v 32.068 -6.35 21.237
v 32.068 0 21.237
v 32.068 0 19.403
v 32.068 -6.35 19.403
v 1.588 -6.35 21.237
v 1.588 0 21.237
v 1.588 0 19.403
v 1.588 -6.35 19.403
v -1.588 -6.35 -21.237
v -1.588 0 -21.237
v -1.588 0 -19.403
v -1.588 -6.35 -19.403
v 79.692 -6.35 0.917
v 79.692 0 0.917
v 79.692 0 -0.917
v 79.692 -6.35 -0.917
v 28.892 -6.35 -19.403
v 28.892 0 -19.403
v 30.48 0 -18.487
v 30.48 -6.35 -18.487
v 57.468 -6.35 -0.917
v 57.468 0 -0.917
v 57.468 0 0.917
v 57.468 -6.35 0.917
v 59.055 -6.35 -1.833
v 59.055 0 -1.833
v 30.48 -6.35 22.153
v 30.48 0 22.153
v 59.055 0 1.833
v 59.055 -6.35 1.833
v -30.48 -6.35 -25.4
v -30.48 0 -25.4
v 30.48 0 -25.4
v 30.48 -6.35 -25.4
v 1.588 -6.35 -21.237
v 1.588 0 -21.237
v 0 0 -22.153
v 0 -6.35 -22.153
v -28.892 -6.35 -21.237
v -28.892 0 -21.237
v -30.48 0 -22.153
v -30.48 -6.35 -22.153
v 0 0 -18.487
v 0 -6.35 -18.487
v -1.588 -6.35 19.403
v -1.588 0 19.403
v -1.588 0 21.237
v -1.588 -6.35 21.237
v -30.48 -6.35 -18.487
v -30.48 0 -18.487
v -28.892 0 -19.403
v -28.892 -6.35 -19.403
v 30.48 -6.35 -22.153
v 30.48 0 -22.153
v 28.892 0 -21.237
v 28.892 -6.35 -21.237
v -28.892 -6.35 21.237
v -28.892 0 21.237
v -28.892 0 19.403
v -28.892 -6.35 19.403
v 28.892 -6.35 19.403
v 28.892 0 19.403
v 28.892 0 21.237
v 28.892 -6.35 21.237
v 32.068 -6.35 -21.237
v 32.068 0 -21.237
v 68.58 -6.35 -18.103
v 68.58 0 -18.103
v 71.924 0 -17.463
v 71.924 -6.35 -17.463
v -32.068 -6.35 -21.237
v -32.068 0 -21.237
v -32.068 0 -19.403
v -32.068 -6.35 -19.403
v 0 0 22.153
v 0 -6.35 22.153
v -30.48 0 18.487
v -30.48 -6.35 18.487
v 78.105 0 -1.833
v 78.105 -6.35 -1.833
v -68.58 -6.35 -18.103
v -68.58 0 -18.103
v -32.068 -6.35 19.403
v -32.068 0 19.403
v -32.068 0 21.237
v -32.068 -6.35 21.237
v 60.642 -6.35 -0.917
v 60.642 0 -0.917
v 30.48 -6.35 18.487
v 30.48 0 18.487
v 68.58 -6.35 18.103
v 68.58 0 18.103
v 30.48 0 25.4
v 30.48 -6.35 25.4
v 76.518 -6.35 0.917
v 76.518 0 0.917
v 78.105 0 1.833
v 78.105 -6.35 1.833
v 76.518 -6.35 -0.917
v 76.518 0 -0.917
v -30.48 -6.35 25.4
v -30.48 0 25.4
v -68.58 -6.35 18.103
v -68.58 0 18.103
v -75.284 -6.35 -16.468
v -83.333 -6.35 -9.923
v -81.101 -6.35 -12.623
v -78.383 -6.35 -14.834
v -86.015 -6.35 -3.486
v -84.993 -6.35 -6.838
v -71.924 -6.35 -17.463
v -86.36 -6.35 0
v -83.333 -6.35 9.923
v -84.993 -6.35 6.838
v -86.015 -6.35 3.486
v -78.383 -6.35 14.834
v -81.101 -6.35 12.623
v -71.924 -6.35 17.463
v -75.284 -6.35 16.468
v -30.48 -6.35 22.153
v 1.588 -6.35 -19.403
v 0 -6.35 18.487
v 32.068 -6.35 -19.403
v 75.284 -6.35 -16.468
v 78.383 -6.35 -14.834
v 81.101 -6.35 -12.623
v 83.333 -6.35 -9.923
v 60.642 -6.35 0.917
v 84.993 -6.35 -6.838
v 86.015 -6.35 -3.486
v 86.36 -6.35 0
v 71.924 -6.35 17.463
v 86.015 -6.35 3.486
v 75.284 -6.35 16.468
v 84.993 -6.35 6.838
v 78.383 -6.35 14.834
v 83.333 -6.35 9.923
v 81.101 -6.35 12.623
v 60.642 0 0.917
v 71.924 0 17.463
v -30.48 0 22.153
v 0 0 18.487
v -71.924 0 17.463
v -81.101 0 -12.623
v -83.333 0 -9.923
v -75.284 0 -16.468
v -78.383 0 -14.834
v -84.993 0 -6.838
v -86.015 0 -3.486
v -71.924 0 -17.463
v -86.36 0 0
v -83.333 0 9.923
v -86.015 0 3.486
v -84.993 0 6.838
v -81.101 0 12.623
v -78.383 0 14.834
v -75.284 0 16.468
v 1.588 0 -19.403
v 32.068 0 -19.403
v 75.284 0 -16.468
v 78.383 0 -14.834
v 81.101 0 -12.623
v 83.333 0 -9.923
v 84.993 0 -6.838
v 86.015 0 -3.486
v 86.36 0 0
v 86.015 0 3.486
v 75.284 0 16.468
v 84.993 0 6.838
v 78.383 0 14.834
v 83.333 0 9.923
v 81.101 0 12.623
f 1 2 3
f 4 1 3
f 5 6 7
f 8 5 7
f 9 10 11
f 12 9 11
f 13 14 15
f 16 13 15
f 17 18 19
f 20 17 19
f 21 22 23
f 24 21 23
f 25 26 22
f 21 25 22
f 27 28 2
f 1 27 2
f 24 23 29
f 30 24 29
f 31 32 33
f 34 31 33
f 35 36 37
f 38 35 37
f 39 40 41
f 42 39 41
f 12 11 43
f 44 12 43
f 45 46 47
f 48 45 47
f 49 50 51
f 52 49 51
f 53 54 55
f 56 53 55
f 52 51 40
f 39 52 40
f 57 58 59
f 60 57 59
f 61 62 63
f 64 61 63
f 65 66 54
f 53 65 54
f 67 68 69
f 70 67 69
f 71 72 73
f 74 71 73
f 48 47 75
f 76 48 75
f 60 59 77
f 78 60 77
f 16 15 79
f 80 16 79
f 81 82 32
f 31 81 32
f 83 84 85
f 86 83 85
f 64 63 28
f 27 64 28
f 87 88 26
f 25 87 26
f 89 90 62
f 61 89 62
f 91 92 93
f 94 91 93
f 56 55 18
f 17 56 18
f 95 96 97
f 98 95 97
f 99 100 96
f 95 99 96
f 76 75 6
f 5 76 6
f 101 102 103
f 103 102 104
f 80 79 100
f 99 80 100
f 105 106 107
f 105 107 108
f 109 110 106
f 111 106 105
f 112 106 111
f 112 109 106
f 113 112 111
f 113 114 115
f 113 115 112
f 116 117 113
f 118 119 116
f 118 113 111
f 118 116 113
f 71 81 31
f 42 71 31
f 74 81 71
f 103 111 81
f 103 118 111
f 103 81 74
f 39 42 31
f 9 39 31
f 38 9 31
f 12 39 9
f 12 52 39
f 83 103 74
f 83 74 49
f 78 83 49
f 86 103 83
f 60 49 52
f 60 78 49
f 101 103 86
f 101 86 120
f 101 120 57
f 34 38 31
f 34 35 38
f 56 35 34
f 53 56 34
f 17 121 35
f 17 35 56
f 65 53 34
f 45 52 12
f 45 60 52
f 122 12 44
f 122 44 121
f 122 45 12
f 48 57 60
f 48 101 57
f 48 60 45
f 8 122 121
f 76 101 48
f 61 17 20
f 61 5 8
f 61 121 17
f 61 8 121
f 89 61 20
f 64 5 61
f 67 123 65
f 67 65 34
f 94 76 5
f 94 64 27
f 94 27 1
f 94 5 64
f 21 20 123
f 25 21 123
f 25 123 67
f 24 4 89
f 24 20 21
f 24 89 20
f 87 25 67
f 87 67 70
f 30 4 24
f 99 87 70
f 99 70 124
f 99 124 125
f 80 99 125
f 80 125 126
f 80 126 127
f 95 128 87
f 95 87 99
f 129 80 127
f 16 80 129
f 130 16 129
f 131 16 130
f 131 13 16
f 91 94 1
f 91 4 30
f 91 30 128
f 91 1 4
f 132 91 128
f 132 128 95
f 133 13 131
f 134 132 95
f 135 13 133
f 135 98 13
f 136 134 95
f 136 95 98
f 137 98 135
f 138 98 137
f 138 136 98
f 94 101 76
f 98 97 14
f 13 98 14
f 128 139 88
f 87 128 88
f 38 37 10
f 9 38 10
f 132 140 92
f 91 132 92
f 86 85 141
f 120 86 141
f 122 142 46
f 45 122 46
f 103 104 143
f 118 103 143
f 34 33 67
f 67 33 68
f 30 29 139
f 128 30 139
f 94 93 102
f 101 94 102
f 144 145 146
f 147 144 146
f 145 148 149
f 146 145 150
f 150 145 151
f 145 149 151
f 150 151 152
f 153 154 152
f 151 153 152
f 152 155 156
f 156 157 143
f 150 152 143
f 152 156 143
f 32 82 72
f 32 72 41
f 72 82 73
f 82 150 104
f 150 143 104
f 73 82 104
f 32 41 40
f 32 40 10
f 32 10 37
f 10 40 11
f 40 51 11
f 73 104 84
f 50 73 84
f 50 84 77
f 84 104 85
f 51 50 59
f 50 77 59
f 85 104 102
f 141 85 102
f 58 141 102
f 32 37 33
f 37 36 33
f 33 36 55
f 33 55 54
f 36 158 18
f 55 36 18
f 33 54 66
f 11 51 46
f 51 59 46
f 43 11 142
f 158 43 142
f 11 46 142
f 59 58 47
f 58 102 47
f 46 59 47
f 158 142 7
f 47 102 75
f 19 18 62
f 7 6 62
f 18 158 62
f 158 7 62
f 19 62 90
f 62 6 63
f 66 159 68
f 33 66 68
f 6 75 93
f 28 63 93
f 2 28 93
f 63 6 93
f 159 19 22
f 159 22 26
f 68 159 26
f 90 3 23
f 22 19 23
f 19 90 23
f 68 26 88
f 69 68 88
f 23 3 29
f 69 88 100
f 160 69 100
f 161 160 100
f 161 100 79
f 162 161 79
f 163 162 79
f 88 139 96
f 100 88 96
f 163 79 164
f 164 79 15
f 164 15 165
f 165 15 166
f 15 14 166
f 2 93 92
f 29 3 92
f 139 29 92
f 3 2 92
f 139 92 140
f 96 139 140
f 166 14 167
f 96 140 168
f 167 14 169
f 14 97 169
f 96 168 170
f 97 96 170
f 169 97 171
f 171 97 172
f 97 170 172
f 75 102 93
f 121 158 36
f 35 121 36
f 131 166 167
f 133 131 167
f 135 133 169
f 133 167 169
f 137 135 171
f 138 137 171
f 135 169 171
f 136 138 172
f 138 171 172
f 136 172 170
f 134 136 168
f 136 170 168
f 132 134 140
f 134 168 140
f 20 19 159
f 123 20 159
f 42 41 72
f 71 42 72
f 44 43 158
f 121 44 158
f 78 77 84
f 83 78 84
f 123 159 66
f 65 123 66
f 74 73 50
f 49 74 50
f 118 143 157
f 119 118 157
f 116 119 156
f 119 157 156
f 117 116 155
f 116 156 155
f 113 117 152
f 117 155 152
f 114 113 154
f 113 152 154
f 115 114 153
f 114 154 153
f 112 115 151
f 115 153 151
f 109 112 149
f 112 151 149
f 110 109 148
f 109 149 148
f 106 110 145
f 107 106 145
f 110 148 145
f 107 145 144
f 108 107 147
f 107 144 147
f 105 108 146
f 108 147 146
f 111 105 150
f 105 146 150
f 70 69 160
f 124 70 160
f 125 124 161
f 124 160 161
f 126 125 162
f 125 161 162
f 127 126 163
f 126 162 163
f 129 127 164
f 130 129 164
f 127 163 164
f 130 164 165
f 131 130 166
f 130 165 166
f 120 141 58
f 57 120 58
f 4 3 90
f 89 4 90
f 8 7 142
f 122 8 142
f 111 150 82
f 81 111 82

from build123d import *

# Parameters (mm, degrees)
F1_DEPTH = 6.35


with BuildPart() as f1:
    # F0 (on Front) → F1 (new body)
    with BuildSketch(Plane.XZ):
        with BuildLine():
            Line((68.58, 18.1031430027), (30.48, 25.4))
            Line((30.48, 25.4), (-30.48, 25.4))
            Line((-30.48, 25.4), (-68.58, 18.1031430027))
            Line((-68.58, 18.1031430027), (-68.58, 17.78))
            ThreePointArc((-68.58, 17.78), (-65.5387583202, 17.5179693185), (-62.5871565312, 16.7396005675))
            Line((-62.5871565312, 16.7396005675), (-61.5696, 17.3270871047))
            Line((-61.5696, 17.3270871047), (-59.9821, 16.4105435523))
            Line((-59.9821, 16.4105435523), (-59.9821, 15.5629211779))
            ThreePointArc((-59.9821, 15.5629211779), (-53.2666224823, 9.0348696172), (-50.8, 0))
            ThreePointArc((-50.8, 0), (-53.2666224823, -9.0348696172), (-59.9821, -15.5629211779))
            Line((-59.9821, -15.5629211779), (-59.9821, -16.4105435523))
            Line((-59.9821, -16.4105435523), (-61.5696, -17.3270871047))
            Line((-61.5696, -17.3270871047), (-62.5871565312, -16.7396005675))
            ThreePointArc((-62.5871565312, -16.7396005675), (-65.5387583202, -17.5179693185), (-68.58, -17.78))
            Line((-68.58, -17.78), (-68.58, -18.1031430027))
            Line((-68.58, -18.1031430027), (-30.48, -25.4))
            Line((-30.48, -25.4), (30.48, -25.4))
            Line((30.48, -25.4), (68.58, -18.1031430027))
            Line((68.58, -18.1031430027), (68.58, -17.78))
            ThreePointArc((68.58, -17.78), (50.8, 0), (68.58, 17.78))
            Line((68.58, 17.78), (68.58, 18.1031430027))
        make_face()
        Polygon((-30.48, -18.4869128953), (-28.8925, -19.4034564477), (-28.8925, -21.2365435523), (-30.48, -22.1530871047), (-32.0675, -21.2365435523), (-32.0675, -19.4034564477), align=None, mode=Mode.SUBTRACT)
        Polygon((-19.05, -15.9469128953), (-17.4625, -16.8634564477), (-17.4625, -18.6965435523), (-19.05, -19.6130871047), (-20.6375, -18.6965435523), (-20.6375, -16.8634564477), align=None, mode=Mode.SUBTRACT)
        Polygon((-48.1514023938, -5.9139128953), (-46.5639023938, -6.8304564477), (-46.5639023938, -8.6635435523), (-48.1514023938, -9.5800871047), (-49.7389023938, -8.6635435523), (-49.7389023938, -6.8304564477), align=None, mode=Mode.SUBTRACT)
        Polygon((0, -18.4869128953), (1.5875, -19.4034564477), (1.5875, -21.2365435523), (0, -22.1530871047), (-1.5875, -21.2365435523), (-1.5875, -19.4034564477), align=None, mode=Mode.SUBTRACT)
        Polygon((30.48, -22.1530871047), (28.8925, -21.2365435523), (28.8925, -19.4034564477), (30.48, -18.4869128953), (32.0675, -19.4034564477), (32.0675, -21.2365435523), align=None, mode=Mode.SUBTRACT)
        Polygon((19.05, -19.6130871047), (17.4625, -18.6965435523), (17.4625, -16.8634564477), (19.05, -15.9469128953), (20.6375, -16.8634564477), (20.6375, -18.6965435523), align=None, mode=Mode.SUBTRACT)
        Polygon((-48.1514023938, 9.5800871047), (-46.5639023938, 8.6635435523), (-46.5639023938, 6.8304564477), (-48.1514023938, 5.9139128953), (-49.7389023938, 6.8304564477), (-49.7389023938, 8.6635435523), align=None, mode=Mode.SUBTRACT)
        Polygon((-19.05, 19.6130871047), (-17.4625, 18.6965435523), (-17.4625, 16.8634564477), (-19.05, 15.9469128953), (-20.6375, 16.8634564477), (-20.6375, 18.6965435523), align=None, mode=Mode.SUBTRACT)
        Polygon((-30.48, 22.1530871047), (-28.8925, 21.2365435523), (-28.8925, 19.4034564477), (-30.48, 18.4869128953), (-32.0675, 19.4034564477), (-32.0675, 21.2365435523), align=None, mode=Mode.SUBTRACT)
        Polygon((19.05, 19.6130871047), (20.6375, 18.6965435523), (20.6375, 16.8634564477), (19.05, 15.9469128953), (17.4625, 16.8634564477), (17.4625, 18.6965435523), align=None, mode=Mode.SUBTRACT)
        Polygon((0, 22.1530871047), (1.5875, 21.2365435523), (1.5875, 19.4034564477), (0, 18.4869128953), (-1.5875, 19.4034564477), (-1.5875, 21.2365435523), align=None, mode=Mode.SUBTRACT)
        Polygon((30.48, 18.4869128953), (28.8925, 19.4034564477), (28.8925, 21.2365435523), (30.48, 22.1530871047), (32.0675, 21.2365435523), (32.0675, 19.4034564477), align=None, mode=Mode.SUBTRACT)
        with BuildLine():
            ThreePointArc((-62.5871565312, 16.7396005675), (-65.5387583202, 17.5179693185), (-68.58, 17.78))
            Line((-68.58, 17.78), (-68.58, 7.3323484187))
            Line((-68.58, 7.3323484187), (-62.23, 3.6661742094))
            Line((-62.23, 3.6661742094), (-62.23, -3.6661742094))
            Line((-62.23, -3.6661742094), (-68.58, -7.3323484187))
            Line((-68.58, -7.3323484187), (-68.58, -17.78))
            ThreePointArc((-68.58, -17.78), (-65.5387583202, -17.5179693185), (-62.5871565312, -16.7396005675))
            Line((-62.5871565312, -16.7396005675), (-63.1571, -16.4105435523))
            Line((-63.1571, -16.4105435523), (-63.1571, -14.5774564477))
            Line((-63.1571, -14.5774564477), (-61.5696, -13.6609128953))
            Line((-61.5696, -13.6609128953), (-59.9821, -14.5774564477))
            Line((-59.9821, -14.5774564477), (-59.9821, -15.5629211779))
            ThreePointArc((-59.9821, -15.5629211779), (-53.2666224823, -9.0348696172), (-50.8, 0))
            ThreePointArc((-50.8, 0), (-53.2666224823, 9.0348696172), (-59.9821, 15.5629211779))
            Line((-59.9821, 15.5629211779), (-59.9821, 14.5774564477))
            Line((-59.9821, 14.5774564477), (-61.5696, 13.6609128953))
            Line((-61.5696, 13.6609128953), (-63.1571, 14.5774564477))
            Line((-63.1571, 14.5774564477), (-63.1571, 16.4105435523))
            Line((-63.1571, 16.4105435523), (-62.5871565312, 16.7396005675))
        make_face()
        with BuildLine():
            Line((-68.58, 7.3323484187), (-68.58, 17.78))
            ThreePointArc((-68.58, 17.78), (-70.259720977, 17.7004784523), (-71.9244167559, 17.4626251338))
            ThreePointArc((-71.9244167559, 17.4626251338), (-86.36, 0), (-71.9244167559, -17.4626251338))
            ThreePointArc((-71.9244167559, -17.4626251338), (-70.259720977, -17.7004784523), (-68.58, -17.78))
            Line((-68.58, -17.78), (-68.58, -7.3323484187))
            Line((-68.58, -7.3323484187), (-74.93, -3.6661742094))
            Line((-74.93, -3.6661742094), (-74.93, 3.6661742094))
            Line((-74.93, 3.6661742094), (-68.58, 7.3323484187))
        make_face()
        Polygon((-74.9877976062, -9.5800871047), (-76.5752976062, -8.6635435523), (-76.5752976062, -6.8304564477), (-74.9877976062, -5.9139128953), (-73.4002976062, -6.8304564477), (-73.4002976062, -8.6635435523), align=None, mode=Mode.SUBTRACT)
        Polygon((-74.9877976062, 9.5800871047), (-73.4002976062, 8.6635435523), (-73.4002976062, 6.8304564477), (-74.9877976062, 5.9139128953), (-76.5752976062, 6.8304564477), (-76.5752976062, 8.6635435523), align=None, mode=Mode.SUBTRACT)
        with BuildLine():
            Line((68.58, -17.78), (68.58, 17.78))
            ThreePointArc((68.58, 17.78), (50.8, 0), (68.58, -17.78))
        make_face()
        Polygon((59.055, -1.8330871047), (57.4675, -0.9165435523), (57.4675, 0.9165435523), (59.055, 1.8330871047), (60.6425, 0.9165435523), (60.6425, -0.9165435523), align=None, mode=Mode.SUBTRACT)
        with BuildLine():
            ThreePointArc((71.9244167559, 17.4626251338), (70.259720977, 17.7004784523), (68.58, 17.78))
            Line((68.58, 17.78), (68.58, -17.78))
            ThreePointArc((68.58, -17.78), (70.259720977, -17.7004784523), (71.9244167559, -17.4626251338))
            ThreePointArc((71.9244167559, -17.4626251338), (82.2838704372, -11.3283862505), (86.36, 0))
            ThreePointArc((86.36, 0), (82.2838704372, 11.3283862505), (71.9244167559, 17.4626251338))
        make_face()
        Polygon((78.105, 1.8330871047), (79.6925, 0.9165435523), (79.6925, -0.9165435523), (78.105, -1.8330871047), (76.5175, -0.9165435523), (76.5175, 0.9165435523), align=None, mode=Mode.SUBTRACT)
        with BuildLine():
            ThreePointArc((-68.58, -17.78), (-70.259720977, -17.7004784523), (-71.9244167559, -17.4626251338))
            Line((-71.9244167559, -17.4626251338), (-68.58, -18.1031430027))
            Line((-68.58, -18.1031430027), (-68.58, -17.78))
        make_face()
        with BuildLine():
            Line((-68.58, 17.78), (-68.58, 18.1031430027))
            Line((-68.58, 18.1031430027), (-71.9244167559, 17.4626251338))
            ThreePointArc((-71.9244167559, 17.4626251338), (-70.259720977, 17.7004784523), (-68.58, 17.78))
        make_face()
        with BuildLine():
            Line((71.9244167559, 17.4626251338), (68.58, 18.1031430027))
            Line((68.58, 18.1031430027), (68.58, 17.78))
            ThreePointArc((68.58, 17.78), (70.259720977, 17.7004784523), (71.9244167559, 17.4626251338))
        make_face()
        with BuildLine():
            ThreePointArc((71.9244167559, -17.4626251338), (70.259720977, -17.7004784523), (68.58, -17.78))
            Line((68.58, -17.78), (68.58, -18.1031430027))
            Line((68.58, -18.1031430027), (71.9244167559, -17.4626251338))
        make_face()
        Polygon((-73.4002976062, 6.8304564477), (-73.4002976062, 8.6635435523), (-74.9877976062, 9.5800871047), (-76.5752976062, 8.6635435523), (-76.5752976062, 6.8304564477), (-74.9877976062, 5.9139128953), align=None)
        Polygon((-76.5752976062, -6.8304564477), (-76.5752976062, -8.6635435523), (-74.9877976062, -9.5800871047), (-73.4002976062, -8.6635435523), (-73.4002976062, -6.8304564477), (-74.9877976062, -5.9139128953), align=None)
        Polygon((-68.58, -7.3323484187), (-68.58, 7.3323484187), (-74.93, 3.6661742094), (-74.93, -3.6661742094), align=None)
        Polygon((-62.23, 3.6661742094), (-68.58, 7.3323484187), (-68.58, -7.3323484187), (-62.23, -3.6661742094), align=None)
        with BuildLine():
            ThreePointArc((-59.9821, 15.5629211779), (-61.260943207, 16.2036973454), (-62.5871565312, 16.7396005675))
            Line((-62.5871565312, 16.7396005675), (-63.1571, 16.4105435523))
            Line((-63.1571, 16.4105435523), (-63.1571, 14.5774564477))
            Line((-63.1571, 14.5774564477), (-61.5696, 13.6609128953))
            Line((-61.5696, 13.6609128953), (-59.9821, 14.5774564477))
            Line((-59.9821, 14.5774564477), (-59.9821, 15.5629211779))
        make_face()
        with BuildLine():
            Line((-61.5696, 17.3270871047), (-62.5871565312, 16.7396005675))
            ThreePointArc((-62.5871565312, 16.7396005675), (-61.260943207, 16.2036973454), (-59.9821, 15.5629211779))
            Line((-59.9821, 15.5629211779), (-59.9821, 16.4105435523))
            Line((-59.9821, 16.4105435523), (-61.5696, 17.3270871047))
        make_face()
        Polygon((-46.5639023938, 6.8304564477), (-46.5639023938, 8.6635435523), (-48.1514023938, 9.5800871047), (-49.7389023938, 8.6635435523), (-49.7389023938, 6.8304564477), (-48.1514023938, 5.9139128953), align=None)
        Polygon((-46.5639023938, -8.6635435523), (-46.5639023938, -6.8304564477), (-48.1514023938, -5.9139128953), (-49.7389023938, -6.8304564477), (-49.7389023938, -8.6635435523), (-48.1514023938, -9.5800871047), align=None)
        with BuildLine():
            Line((-63.1571, -16.4105435523), (-62.5871565312, -16.7396005675))
            ThreePointArc((-62.5871565312, -16.7396005675), (-61.260943207, -16.2036973454), (-59.9821, -15.5629211779))
            Line((-59.9821, -15.5629211779), (-59.9821, -14.5774564477))
            Line((-59.9821, -14.5774564477), (-61.5696, -13.6609128953))
            Line((-61.5696, -13.6609128953), (-63.1571, -14.5774564477))
            Line((-63.1571, -14.5774564477), (-63.1571, -16.4105435523))
        make_face()
        with BuildLine():
            ThreePointArc((-59.9821, -15.5629211779), (-61.260943207, -16.2036973454), (-62.5871565312, -16.7396005675))
            Line((-62.5871565312, -16.7396005675), (-61.5696, -17.3270871047))
            Line((-61.5696, -17.3270871047), (-59.9821, -16.4105435523))
            Line((-59.9821, -16.4105435523), (-59.9821, -15.5629211779))
        make_face()
        Polygon((-17.4625, 16.8634564477), (-17.4625, 18.6965435523), (-19.05, 19.6130871047), (-20.6375, 18.6965435523), (-20.6375, 16.8634564477), (-19.05, 15.9469128953), align=None)
        Polygon((-17.4625, -18.6965435523), (-17.4625, -16.8634564477), (-19.05, -15.9469128953), (-20.6375, -16.8634564477), (-20.6375, -18.6965435523), (-19.05, -19.6130871047), align=None)
        Polygon((17.4625, -16.8634564477), (17.4625, -18.6965435523), (19.05, -19.6130871047), (20.6375, -18.6965435523), (20.6375, -16.8634564477), (19.05, -15.9469128953), align=None)
        Polygon((20.6375, 16.8634564477), (20.6375, 18.6965435523), (19.05, 19.6130871047), (17.4625, 18.6965435523), (17.4625, 16.8634564477), (19.05, 15.9469128953), align=None)
    extrude(amount=F1_DEPTH)


solid = f1.part
